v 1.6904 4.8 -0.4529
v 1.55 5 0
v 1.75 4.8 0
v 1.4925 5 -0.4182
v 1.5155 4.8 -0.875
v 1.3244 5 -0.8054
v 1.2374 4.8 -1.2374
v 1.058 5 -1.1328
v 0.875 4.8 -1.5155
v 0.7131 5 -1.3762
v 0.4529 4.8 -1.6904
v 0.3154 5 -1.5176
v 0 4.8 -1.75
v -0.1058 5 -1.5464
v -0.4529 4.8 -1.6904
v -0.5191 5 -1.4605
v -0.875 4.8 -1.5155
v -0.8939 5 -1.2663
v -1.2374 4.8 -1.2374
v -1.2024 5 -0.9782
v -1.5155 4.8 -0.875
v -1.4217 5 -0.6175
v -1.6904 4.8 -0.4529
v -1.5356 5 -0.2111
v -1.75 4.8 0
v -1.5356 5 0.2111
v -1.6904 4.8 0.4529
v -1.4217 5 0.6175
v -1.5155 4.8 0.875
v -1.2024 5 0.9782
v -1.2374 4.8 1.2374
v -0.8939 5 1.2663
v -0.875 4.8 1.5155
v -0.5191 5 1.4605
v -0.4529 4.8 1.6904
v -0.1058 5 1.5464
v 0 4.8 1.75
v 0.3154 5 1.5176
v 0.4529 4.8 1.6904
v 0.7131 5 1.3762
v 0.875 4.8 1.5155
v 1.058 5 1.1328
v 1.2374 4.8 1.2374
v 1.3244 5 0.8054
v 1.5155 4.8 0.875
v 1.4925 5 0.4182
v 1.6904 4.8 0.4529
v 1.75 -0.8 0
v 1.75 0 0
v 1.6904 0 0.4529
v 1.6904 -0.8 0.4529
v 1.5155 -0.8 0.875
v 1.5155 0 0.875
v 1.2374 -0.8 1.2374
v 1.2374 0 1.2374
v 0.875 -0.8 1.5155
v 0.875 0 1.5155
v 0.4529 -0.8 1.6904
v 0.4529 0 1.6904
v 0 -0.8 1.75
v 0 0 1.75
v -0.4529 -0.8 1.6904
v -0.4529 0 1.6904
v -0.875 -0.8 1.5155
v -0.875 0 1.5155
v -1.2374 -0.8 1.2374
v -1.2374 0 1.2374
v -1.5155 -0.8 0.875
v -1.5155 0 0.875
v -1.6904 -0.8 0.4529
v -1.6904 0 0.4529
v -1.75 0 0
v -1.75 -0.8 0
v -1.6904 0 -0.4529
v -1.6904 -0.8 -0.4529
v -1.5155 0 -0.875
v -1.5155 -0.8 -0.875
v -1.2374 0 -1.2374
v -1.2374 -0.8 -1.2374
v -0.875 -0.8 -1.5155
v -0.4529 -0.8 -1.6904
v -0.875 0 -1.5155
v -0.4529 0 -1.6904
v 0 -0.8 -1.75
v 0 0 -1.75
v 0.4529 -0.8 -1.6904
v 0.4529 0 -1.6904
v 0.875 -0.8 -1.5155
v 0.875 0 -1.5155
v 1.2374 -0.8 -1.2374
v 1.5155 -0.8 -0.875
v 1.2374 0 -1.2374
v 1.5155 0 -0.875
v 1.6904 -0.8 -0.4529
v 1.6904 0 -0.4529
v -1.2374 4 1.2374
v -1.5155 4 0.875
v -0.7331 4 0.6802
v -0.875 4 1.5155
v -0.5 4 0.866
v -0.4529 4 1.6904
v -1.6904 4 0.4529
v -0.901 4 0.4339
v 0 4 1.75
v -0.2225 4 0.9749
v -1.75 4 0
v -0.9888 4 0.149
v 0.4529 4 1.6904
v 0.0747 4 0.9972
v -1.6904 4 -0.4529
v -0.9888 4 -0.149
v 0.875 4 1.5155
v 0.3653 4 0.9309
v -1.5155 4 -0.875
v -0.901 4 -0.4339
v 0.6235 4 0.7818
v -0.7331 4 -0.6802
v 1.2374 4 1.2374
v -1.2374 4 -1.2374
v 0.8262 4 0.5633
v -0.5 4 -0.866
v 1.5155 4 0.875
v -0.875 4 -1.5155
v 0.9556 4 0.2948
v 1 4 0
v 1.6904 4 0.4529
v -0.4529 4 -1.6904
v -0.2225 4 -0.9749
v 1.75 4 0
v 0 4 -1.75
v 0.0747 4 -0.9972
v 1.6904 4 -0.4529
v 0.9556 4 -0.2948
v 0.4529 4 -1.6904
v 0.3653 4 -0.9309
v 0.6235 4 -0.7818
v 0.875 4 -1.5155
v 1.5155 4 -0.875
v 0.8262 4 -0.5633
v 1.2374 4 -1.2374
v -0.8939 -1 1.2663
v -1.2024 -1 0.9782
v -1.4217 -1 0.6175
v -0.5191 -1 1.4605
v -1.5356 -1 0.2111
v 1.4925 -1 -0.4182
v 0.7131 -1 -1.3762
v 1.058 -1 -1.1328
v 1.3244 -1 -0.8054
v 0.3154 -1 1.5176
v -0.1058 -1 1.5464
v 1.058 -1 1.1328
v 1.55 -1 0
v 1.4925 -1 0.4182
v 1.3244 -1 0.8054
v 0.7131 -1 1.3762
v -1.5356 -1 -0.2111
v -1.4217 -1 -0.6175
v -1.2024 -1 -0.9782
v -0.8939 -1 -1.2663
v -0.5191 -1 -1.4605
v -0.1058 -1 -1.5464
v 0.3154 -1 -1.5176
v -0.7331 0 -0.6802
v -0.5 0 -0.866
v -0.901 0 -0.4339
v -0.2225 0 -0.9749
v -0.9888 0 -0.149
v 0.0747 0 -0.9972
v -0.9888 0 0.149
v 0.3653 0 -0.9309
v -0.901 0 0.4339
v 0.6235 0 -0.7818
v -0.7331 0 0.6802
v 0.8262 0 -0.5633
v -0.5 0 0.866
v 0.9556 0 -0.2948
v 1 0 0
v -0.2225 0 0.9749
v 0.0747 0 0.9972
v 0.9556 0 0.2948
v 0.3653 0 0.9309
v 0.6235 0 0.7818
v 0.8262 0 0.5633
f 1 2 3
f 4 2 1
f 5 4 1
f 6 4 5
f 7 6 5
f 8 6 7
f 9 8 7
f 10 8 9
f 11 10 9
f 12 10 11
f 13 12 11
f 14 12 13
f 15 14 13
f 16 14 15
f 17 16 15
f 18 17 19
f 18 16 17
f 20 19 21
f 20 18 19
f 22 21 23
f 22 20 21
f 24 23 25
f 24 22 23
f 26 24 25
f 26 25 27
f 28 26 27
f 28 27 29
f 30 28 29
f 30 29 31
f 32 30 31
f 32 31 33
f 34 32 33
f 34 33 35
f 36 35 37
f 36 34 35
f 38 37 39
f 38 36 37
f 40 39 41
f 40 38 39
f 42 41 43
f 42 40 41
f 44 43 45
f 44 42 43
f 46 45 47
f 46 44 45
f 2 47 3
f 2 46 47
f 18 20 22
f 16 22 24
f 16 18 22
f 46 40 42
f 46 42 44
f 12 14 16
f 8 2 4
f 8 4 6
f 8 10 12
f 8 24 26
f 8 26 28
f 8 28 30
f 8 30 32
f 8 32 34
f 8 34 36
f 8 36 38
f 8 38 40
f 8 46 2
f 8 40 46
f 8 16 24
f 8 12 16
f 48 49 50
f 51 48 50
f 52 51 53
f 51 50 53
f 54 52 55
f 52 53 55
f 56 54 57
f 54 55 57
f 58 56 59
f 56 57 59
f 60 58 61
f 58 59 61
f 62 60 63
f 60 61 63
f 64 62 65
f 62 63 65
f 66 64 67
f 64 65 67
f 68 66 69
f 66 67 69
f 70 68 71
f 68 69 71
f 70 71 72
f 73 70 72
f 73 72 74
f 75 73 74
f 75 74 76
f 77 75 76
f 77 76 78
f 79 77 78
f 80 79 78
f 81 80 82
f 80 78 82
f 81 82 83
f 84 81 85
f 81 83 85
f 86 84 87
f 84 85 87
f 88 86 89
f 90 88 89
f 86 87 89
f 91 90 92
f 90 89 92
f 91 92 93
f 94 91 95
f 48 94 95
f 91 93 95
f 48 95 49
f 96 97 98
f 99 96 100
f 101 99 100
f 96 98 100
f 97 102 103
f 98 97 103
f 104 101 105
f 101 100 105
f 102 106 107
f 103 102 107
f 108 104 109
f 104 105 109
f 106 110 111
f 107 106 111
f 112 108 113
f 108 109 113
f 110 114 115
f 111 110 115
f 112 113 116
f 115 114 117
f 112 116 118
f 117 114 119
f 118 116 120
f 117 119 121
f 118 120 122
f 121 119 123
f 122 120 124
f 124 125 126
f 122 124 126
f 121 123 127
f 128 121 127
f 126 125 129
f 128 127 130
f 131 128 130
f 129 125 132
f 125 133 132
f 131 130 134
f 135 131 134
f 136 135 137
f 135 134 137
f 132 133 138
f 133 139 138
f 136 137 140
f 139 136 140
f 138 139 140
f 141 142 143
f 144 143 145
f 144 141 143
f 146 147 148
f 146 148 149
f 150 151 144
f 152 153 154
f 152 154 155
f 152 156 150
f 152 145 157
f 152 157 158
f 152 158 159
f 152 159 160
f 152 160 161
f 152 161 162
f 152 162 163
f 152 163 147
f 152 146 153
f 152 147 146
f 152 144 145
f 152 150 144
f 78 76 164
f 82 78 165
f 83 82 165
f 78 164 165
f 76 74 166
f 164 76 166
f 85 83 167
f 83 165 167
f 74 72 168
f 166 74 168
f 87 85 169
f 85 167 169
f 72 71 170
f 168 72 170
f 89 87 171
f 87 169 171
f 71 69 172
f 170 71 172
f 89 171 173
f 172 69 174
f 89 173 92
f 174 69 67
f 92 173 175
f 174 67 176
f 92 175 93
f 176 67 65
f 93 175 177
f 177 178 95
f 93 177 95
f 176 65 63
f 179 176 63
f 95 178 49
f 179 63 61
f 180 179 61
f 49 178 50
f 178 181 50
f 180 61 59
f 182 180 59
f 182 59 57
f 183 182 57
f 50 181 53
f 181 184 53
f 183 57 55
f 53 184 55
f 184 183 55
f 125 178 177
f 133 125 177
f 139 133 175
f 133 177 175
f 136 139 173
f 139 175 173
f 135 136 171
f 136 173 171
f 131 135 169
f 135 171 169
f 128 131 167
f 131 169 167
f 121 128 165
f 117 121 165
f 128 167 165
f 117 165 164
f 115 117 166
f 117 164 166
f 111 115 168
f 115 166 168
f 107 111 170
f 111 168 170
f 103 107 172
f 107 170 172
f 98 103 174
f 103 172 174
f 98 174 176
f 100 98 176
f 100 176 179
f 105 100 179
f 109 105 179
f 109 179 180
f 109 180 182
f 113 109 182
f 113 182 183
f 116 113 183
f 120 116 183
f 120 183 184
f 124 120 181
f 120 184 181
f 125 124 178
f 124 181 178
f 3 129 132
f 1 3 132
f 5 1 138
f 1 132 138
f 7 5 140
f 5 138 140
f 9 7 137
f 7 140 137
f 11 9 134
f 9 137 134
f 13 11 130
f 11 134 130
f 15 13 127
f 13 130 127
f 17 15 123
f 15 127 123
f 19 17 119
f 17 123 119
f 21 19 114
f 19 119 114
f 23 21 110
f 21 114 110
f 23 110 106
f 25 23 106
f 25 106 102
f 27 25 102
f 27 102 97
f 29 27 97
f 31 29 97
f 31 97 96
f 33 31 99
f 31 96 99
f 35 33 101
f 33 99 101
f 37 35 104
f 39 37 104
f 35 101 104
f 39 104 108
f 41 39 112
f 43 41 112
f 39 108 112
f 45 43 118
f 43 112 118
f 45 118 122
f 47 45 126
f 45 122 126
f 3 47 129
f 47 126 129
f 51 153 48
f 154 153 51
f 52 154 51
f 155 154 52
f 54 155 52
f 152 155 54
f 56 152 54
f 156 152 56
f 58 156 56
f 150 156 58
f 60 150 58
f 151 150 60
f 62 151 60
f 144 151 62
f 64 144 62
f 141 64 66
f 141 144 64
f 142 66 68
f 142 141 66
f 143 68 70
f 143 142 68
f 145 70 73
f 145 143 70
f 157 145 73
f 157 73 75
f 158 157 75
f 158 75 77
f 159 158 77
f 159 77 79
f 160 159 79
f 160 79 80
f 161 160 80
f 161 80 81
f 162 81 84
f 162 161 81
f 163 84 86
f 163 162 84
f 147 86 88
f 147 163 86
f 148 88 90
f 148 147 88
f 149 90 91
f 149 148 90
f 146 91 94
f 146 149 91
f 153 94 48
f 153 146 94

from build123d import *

# Parameters (mm, degrees)
SKETCH1_R           = 1
BOSS_EXTRUDE1_DEPTH = 4
SKETCH2_R           = 1.75
BOSS_EXTRUDE2_DEPTH = 1
CHAMFER1_SIZE       = 0.2
SKETCH3_R           = 1.75
BOSS_EXTRUDE3_DEPTH = 1
CHAMFER2_SIZE       = 0.2


with BuildPart() as part:
    # Sketch1 → Boss-Extrude1 (new body)
    with BuildSketch(Plane(origin=(0, 0, 0), x_dir=(1, 0, 0), z_dir=(0, 1, 0))):
        Circle(SKETCH1_R)
    extrude(amount=BOSS_EXTRUDE1_DEPTH)

    # Sketch2 → Boss-Extrude2 (add)
    with BuildSketch(Plane(origin=(0, 4, 0), x_dir=(1, 0, 0), z_dir=(0, 1, 0))):
        Circle(SKETCH2_R)
    extrude(amount=BOSS_EXTRUDE2_DEPTH)

    # Chamfer1
    chamfer1_edges = [part.edges().sort_by_distance(p)[0] for p in [
        (-1.75, 5, 0),
    ]]
    chamfer(chamfer1_edges, length=CHAMFER1_SIZE)

    # Sketch3 → Boss-Extrude3 (add)
    with BuildSketch(Plane.XZ):
        Circle(SKETCH3_R)
    extrude(amount=BOSS_EXTRUDE3_DEPTH)

    # Chamfer2
    chamfer2_edges = [part.edges().sort_by_distance(p)[0] for p in [
        (-1.75, -1, 0),
    ]]
    chamfer(chamfer2_edges, length=CHAMFER2_SIZE)


solid = part.part
